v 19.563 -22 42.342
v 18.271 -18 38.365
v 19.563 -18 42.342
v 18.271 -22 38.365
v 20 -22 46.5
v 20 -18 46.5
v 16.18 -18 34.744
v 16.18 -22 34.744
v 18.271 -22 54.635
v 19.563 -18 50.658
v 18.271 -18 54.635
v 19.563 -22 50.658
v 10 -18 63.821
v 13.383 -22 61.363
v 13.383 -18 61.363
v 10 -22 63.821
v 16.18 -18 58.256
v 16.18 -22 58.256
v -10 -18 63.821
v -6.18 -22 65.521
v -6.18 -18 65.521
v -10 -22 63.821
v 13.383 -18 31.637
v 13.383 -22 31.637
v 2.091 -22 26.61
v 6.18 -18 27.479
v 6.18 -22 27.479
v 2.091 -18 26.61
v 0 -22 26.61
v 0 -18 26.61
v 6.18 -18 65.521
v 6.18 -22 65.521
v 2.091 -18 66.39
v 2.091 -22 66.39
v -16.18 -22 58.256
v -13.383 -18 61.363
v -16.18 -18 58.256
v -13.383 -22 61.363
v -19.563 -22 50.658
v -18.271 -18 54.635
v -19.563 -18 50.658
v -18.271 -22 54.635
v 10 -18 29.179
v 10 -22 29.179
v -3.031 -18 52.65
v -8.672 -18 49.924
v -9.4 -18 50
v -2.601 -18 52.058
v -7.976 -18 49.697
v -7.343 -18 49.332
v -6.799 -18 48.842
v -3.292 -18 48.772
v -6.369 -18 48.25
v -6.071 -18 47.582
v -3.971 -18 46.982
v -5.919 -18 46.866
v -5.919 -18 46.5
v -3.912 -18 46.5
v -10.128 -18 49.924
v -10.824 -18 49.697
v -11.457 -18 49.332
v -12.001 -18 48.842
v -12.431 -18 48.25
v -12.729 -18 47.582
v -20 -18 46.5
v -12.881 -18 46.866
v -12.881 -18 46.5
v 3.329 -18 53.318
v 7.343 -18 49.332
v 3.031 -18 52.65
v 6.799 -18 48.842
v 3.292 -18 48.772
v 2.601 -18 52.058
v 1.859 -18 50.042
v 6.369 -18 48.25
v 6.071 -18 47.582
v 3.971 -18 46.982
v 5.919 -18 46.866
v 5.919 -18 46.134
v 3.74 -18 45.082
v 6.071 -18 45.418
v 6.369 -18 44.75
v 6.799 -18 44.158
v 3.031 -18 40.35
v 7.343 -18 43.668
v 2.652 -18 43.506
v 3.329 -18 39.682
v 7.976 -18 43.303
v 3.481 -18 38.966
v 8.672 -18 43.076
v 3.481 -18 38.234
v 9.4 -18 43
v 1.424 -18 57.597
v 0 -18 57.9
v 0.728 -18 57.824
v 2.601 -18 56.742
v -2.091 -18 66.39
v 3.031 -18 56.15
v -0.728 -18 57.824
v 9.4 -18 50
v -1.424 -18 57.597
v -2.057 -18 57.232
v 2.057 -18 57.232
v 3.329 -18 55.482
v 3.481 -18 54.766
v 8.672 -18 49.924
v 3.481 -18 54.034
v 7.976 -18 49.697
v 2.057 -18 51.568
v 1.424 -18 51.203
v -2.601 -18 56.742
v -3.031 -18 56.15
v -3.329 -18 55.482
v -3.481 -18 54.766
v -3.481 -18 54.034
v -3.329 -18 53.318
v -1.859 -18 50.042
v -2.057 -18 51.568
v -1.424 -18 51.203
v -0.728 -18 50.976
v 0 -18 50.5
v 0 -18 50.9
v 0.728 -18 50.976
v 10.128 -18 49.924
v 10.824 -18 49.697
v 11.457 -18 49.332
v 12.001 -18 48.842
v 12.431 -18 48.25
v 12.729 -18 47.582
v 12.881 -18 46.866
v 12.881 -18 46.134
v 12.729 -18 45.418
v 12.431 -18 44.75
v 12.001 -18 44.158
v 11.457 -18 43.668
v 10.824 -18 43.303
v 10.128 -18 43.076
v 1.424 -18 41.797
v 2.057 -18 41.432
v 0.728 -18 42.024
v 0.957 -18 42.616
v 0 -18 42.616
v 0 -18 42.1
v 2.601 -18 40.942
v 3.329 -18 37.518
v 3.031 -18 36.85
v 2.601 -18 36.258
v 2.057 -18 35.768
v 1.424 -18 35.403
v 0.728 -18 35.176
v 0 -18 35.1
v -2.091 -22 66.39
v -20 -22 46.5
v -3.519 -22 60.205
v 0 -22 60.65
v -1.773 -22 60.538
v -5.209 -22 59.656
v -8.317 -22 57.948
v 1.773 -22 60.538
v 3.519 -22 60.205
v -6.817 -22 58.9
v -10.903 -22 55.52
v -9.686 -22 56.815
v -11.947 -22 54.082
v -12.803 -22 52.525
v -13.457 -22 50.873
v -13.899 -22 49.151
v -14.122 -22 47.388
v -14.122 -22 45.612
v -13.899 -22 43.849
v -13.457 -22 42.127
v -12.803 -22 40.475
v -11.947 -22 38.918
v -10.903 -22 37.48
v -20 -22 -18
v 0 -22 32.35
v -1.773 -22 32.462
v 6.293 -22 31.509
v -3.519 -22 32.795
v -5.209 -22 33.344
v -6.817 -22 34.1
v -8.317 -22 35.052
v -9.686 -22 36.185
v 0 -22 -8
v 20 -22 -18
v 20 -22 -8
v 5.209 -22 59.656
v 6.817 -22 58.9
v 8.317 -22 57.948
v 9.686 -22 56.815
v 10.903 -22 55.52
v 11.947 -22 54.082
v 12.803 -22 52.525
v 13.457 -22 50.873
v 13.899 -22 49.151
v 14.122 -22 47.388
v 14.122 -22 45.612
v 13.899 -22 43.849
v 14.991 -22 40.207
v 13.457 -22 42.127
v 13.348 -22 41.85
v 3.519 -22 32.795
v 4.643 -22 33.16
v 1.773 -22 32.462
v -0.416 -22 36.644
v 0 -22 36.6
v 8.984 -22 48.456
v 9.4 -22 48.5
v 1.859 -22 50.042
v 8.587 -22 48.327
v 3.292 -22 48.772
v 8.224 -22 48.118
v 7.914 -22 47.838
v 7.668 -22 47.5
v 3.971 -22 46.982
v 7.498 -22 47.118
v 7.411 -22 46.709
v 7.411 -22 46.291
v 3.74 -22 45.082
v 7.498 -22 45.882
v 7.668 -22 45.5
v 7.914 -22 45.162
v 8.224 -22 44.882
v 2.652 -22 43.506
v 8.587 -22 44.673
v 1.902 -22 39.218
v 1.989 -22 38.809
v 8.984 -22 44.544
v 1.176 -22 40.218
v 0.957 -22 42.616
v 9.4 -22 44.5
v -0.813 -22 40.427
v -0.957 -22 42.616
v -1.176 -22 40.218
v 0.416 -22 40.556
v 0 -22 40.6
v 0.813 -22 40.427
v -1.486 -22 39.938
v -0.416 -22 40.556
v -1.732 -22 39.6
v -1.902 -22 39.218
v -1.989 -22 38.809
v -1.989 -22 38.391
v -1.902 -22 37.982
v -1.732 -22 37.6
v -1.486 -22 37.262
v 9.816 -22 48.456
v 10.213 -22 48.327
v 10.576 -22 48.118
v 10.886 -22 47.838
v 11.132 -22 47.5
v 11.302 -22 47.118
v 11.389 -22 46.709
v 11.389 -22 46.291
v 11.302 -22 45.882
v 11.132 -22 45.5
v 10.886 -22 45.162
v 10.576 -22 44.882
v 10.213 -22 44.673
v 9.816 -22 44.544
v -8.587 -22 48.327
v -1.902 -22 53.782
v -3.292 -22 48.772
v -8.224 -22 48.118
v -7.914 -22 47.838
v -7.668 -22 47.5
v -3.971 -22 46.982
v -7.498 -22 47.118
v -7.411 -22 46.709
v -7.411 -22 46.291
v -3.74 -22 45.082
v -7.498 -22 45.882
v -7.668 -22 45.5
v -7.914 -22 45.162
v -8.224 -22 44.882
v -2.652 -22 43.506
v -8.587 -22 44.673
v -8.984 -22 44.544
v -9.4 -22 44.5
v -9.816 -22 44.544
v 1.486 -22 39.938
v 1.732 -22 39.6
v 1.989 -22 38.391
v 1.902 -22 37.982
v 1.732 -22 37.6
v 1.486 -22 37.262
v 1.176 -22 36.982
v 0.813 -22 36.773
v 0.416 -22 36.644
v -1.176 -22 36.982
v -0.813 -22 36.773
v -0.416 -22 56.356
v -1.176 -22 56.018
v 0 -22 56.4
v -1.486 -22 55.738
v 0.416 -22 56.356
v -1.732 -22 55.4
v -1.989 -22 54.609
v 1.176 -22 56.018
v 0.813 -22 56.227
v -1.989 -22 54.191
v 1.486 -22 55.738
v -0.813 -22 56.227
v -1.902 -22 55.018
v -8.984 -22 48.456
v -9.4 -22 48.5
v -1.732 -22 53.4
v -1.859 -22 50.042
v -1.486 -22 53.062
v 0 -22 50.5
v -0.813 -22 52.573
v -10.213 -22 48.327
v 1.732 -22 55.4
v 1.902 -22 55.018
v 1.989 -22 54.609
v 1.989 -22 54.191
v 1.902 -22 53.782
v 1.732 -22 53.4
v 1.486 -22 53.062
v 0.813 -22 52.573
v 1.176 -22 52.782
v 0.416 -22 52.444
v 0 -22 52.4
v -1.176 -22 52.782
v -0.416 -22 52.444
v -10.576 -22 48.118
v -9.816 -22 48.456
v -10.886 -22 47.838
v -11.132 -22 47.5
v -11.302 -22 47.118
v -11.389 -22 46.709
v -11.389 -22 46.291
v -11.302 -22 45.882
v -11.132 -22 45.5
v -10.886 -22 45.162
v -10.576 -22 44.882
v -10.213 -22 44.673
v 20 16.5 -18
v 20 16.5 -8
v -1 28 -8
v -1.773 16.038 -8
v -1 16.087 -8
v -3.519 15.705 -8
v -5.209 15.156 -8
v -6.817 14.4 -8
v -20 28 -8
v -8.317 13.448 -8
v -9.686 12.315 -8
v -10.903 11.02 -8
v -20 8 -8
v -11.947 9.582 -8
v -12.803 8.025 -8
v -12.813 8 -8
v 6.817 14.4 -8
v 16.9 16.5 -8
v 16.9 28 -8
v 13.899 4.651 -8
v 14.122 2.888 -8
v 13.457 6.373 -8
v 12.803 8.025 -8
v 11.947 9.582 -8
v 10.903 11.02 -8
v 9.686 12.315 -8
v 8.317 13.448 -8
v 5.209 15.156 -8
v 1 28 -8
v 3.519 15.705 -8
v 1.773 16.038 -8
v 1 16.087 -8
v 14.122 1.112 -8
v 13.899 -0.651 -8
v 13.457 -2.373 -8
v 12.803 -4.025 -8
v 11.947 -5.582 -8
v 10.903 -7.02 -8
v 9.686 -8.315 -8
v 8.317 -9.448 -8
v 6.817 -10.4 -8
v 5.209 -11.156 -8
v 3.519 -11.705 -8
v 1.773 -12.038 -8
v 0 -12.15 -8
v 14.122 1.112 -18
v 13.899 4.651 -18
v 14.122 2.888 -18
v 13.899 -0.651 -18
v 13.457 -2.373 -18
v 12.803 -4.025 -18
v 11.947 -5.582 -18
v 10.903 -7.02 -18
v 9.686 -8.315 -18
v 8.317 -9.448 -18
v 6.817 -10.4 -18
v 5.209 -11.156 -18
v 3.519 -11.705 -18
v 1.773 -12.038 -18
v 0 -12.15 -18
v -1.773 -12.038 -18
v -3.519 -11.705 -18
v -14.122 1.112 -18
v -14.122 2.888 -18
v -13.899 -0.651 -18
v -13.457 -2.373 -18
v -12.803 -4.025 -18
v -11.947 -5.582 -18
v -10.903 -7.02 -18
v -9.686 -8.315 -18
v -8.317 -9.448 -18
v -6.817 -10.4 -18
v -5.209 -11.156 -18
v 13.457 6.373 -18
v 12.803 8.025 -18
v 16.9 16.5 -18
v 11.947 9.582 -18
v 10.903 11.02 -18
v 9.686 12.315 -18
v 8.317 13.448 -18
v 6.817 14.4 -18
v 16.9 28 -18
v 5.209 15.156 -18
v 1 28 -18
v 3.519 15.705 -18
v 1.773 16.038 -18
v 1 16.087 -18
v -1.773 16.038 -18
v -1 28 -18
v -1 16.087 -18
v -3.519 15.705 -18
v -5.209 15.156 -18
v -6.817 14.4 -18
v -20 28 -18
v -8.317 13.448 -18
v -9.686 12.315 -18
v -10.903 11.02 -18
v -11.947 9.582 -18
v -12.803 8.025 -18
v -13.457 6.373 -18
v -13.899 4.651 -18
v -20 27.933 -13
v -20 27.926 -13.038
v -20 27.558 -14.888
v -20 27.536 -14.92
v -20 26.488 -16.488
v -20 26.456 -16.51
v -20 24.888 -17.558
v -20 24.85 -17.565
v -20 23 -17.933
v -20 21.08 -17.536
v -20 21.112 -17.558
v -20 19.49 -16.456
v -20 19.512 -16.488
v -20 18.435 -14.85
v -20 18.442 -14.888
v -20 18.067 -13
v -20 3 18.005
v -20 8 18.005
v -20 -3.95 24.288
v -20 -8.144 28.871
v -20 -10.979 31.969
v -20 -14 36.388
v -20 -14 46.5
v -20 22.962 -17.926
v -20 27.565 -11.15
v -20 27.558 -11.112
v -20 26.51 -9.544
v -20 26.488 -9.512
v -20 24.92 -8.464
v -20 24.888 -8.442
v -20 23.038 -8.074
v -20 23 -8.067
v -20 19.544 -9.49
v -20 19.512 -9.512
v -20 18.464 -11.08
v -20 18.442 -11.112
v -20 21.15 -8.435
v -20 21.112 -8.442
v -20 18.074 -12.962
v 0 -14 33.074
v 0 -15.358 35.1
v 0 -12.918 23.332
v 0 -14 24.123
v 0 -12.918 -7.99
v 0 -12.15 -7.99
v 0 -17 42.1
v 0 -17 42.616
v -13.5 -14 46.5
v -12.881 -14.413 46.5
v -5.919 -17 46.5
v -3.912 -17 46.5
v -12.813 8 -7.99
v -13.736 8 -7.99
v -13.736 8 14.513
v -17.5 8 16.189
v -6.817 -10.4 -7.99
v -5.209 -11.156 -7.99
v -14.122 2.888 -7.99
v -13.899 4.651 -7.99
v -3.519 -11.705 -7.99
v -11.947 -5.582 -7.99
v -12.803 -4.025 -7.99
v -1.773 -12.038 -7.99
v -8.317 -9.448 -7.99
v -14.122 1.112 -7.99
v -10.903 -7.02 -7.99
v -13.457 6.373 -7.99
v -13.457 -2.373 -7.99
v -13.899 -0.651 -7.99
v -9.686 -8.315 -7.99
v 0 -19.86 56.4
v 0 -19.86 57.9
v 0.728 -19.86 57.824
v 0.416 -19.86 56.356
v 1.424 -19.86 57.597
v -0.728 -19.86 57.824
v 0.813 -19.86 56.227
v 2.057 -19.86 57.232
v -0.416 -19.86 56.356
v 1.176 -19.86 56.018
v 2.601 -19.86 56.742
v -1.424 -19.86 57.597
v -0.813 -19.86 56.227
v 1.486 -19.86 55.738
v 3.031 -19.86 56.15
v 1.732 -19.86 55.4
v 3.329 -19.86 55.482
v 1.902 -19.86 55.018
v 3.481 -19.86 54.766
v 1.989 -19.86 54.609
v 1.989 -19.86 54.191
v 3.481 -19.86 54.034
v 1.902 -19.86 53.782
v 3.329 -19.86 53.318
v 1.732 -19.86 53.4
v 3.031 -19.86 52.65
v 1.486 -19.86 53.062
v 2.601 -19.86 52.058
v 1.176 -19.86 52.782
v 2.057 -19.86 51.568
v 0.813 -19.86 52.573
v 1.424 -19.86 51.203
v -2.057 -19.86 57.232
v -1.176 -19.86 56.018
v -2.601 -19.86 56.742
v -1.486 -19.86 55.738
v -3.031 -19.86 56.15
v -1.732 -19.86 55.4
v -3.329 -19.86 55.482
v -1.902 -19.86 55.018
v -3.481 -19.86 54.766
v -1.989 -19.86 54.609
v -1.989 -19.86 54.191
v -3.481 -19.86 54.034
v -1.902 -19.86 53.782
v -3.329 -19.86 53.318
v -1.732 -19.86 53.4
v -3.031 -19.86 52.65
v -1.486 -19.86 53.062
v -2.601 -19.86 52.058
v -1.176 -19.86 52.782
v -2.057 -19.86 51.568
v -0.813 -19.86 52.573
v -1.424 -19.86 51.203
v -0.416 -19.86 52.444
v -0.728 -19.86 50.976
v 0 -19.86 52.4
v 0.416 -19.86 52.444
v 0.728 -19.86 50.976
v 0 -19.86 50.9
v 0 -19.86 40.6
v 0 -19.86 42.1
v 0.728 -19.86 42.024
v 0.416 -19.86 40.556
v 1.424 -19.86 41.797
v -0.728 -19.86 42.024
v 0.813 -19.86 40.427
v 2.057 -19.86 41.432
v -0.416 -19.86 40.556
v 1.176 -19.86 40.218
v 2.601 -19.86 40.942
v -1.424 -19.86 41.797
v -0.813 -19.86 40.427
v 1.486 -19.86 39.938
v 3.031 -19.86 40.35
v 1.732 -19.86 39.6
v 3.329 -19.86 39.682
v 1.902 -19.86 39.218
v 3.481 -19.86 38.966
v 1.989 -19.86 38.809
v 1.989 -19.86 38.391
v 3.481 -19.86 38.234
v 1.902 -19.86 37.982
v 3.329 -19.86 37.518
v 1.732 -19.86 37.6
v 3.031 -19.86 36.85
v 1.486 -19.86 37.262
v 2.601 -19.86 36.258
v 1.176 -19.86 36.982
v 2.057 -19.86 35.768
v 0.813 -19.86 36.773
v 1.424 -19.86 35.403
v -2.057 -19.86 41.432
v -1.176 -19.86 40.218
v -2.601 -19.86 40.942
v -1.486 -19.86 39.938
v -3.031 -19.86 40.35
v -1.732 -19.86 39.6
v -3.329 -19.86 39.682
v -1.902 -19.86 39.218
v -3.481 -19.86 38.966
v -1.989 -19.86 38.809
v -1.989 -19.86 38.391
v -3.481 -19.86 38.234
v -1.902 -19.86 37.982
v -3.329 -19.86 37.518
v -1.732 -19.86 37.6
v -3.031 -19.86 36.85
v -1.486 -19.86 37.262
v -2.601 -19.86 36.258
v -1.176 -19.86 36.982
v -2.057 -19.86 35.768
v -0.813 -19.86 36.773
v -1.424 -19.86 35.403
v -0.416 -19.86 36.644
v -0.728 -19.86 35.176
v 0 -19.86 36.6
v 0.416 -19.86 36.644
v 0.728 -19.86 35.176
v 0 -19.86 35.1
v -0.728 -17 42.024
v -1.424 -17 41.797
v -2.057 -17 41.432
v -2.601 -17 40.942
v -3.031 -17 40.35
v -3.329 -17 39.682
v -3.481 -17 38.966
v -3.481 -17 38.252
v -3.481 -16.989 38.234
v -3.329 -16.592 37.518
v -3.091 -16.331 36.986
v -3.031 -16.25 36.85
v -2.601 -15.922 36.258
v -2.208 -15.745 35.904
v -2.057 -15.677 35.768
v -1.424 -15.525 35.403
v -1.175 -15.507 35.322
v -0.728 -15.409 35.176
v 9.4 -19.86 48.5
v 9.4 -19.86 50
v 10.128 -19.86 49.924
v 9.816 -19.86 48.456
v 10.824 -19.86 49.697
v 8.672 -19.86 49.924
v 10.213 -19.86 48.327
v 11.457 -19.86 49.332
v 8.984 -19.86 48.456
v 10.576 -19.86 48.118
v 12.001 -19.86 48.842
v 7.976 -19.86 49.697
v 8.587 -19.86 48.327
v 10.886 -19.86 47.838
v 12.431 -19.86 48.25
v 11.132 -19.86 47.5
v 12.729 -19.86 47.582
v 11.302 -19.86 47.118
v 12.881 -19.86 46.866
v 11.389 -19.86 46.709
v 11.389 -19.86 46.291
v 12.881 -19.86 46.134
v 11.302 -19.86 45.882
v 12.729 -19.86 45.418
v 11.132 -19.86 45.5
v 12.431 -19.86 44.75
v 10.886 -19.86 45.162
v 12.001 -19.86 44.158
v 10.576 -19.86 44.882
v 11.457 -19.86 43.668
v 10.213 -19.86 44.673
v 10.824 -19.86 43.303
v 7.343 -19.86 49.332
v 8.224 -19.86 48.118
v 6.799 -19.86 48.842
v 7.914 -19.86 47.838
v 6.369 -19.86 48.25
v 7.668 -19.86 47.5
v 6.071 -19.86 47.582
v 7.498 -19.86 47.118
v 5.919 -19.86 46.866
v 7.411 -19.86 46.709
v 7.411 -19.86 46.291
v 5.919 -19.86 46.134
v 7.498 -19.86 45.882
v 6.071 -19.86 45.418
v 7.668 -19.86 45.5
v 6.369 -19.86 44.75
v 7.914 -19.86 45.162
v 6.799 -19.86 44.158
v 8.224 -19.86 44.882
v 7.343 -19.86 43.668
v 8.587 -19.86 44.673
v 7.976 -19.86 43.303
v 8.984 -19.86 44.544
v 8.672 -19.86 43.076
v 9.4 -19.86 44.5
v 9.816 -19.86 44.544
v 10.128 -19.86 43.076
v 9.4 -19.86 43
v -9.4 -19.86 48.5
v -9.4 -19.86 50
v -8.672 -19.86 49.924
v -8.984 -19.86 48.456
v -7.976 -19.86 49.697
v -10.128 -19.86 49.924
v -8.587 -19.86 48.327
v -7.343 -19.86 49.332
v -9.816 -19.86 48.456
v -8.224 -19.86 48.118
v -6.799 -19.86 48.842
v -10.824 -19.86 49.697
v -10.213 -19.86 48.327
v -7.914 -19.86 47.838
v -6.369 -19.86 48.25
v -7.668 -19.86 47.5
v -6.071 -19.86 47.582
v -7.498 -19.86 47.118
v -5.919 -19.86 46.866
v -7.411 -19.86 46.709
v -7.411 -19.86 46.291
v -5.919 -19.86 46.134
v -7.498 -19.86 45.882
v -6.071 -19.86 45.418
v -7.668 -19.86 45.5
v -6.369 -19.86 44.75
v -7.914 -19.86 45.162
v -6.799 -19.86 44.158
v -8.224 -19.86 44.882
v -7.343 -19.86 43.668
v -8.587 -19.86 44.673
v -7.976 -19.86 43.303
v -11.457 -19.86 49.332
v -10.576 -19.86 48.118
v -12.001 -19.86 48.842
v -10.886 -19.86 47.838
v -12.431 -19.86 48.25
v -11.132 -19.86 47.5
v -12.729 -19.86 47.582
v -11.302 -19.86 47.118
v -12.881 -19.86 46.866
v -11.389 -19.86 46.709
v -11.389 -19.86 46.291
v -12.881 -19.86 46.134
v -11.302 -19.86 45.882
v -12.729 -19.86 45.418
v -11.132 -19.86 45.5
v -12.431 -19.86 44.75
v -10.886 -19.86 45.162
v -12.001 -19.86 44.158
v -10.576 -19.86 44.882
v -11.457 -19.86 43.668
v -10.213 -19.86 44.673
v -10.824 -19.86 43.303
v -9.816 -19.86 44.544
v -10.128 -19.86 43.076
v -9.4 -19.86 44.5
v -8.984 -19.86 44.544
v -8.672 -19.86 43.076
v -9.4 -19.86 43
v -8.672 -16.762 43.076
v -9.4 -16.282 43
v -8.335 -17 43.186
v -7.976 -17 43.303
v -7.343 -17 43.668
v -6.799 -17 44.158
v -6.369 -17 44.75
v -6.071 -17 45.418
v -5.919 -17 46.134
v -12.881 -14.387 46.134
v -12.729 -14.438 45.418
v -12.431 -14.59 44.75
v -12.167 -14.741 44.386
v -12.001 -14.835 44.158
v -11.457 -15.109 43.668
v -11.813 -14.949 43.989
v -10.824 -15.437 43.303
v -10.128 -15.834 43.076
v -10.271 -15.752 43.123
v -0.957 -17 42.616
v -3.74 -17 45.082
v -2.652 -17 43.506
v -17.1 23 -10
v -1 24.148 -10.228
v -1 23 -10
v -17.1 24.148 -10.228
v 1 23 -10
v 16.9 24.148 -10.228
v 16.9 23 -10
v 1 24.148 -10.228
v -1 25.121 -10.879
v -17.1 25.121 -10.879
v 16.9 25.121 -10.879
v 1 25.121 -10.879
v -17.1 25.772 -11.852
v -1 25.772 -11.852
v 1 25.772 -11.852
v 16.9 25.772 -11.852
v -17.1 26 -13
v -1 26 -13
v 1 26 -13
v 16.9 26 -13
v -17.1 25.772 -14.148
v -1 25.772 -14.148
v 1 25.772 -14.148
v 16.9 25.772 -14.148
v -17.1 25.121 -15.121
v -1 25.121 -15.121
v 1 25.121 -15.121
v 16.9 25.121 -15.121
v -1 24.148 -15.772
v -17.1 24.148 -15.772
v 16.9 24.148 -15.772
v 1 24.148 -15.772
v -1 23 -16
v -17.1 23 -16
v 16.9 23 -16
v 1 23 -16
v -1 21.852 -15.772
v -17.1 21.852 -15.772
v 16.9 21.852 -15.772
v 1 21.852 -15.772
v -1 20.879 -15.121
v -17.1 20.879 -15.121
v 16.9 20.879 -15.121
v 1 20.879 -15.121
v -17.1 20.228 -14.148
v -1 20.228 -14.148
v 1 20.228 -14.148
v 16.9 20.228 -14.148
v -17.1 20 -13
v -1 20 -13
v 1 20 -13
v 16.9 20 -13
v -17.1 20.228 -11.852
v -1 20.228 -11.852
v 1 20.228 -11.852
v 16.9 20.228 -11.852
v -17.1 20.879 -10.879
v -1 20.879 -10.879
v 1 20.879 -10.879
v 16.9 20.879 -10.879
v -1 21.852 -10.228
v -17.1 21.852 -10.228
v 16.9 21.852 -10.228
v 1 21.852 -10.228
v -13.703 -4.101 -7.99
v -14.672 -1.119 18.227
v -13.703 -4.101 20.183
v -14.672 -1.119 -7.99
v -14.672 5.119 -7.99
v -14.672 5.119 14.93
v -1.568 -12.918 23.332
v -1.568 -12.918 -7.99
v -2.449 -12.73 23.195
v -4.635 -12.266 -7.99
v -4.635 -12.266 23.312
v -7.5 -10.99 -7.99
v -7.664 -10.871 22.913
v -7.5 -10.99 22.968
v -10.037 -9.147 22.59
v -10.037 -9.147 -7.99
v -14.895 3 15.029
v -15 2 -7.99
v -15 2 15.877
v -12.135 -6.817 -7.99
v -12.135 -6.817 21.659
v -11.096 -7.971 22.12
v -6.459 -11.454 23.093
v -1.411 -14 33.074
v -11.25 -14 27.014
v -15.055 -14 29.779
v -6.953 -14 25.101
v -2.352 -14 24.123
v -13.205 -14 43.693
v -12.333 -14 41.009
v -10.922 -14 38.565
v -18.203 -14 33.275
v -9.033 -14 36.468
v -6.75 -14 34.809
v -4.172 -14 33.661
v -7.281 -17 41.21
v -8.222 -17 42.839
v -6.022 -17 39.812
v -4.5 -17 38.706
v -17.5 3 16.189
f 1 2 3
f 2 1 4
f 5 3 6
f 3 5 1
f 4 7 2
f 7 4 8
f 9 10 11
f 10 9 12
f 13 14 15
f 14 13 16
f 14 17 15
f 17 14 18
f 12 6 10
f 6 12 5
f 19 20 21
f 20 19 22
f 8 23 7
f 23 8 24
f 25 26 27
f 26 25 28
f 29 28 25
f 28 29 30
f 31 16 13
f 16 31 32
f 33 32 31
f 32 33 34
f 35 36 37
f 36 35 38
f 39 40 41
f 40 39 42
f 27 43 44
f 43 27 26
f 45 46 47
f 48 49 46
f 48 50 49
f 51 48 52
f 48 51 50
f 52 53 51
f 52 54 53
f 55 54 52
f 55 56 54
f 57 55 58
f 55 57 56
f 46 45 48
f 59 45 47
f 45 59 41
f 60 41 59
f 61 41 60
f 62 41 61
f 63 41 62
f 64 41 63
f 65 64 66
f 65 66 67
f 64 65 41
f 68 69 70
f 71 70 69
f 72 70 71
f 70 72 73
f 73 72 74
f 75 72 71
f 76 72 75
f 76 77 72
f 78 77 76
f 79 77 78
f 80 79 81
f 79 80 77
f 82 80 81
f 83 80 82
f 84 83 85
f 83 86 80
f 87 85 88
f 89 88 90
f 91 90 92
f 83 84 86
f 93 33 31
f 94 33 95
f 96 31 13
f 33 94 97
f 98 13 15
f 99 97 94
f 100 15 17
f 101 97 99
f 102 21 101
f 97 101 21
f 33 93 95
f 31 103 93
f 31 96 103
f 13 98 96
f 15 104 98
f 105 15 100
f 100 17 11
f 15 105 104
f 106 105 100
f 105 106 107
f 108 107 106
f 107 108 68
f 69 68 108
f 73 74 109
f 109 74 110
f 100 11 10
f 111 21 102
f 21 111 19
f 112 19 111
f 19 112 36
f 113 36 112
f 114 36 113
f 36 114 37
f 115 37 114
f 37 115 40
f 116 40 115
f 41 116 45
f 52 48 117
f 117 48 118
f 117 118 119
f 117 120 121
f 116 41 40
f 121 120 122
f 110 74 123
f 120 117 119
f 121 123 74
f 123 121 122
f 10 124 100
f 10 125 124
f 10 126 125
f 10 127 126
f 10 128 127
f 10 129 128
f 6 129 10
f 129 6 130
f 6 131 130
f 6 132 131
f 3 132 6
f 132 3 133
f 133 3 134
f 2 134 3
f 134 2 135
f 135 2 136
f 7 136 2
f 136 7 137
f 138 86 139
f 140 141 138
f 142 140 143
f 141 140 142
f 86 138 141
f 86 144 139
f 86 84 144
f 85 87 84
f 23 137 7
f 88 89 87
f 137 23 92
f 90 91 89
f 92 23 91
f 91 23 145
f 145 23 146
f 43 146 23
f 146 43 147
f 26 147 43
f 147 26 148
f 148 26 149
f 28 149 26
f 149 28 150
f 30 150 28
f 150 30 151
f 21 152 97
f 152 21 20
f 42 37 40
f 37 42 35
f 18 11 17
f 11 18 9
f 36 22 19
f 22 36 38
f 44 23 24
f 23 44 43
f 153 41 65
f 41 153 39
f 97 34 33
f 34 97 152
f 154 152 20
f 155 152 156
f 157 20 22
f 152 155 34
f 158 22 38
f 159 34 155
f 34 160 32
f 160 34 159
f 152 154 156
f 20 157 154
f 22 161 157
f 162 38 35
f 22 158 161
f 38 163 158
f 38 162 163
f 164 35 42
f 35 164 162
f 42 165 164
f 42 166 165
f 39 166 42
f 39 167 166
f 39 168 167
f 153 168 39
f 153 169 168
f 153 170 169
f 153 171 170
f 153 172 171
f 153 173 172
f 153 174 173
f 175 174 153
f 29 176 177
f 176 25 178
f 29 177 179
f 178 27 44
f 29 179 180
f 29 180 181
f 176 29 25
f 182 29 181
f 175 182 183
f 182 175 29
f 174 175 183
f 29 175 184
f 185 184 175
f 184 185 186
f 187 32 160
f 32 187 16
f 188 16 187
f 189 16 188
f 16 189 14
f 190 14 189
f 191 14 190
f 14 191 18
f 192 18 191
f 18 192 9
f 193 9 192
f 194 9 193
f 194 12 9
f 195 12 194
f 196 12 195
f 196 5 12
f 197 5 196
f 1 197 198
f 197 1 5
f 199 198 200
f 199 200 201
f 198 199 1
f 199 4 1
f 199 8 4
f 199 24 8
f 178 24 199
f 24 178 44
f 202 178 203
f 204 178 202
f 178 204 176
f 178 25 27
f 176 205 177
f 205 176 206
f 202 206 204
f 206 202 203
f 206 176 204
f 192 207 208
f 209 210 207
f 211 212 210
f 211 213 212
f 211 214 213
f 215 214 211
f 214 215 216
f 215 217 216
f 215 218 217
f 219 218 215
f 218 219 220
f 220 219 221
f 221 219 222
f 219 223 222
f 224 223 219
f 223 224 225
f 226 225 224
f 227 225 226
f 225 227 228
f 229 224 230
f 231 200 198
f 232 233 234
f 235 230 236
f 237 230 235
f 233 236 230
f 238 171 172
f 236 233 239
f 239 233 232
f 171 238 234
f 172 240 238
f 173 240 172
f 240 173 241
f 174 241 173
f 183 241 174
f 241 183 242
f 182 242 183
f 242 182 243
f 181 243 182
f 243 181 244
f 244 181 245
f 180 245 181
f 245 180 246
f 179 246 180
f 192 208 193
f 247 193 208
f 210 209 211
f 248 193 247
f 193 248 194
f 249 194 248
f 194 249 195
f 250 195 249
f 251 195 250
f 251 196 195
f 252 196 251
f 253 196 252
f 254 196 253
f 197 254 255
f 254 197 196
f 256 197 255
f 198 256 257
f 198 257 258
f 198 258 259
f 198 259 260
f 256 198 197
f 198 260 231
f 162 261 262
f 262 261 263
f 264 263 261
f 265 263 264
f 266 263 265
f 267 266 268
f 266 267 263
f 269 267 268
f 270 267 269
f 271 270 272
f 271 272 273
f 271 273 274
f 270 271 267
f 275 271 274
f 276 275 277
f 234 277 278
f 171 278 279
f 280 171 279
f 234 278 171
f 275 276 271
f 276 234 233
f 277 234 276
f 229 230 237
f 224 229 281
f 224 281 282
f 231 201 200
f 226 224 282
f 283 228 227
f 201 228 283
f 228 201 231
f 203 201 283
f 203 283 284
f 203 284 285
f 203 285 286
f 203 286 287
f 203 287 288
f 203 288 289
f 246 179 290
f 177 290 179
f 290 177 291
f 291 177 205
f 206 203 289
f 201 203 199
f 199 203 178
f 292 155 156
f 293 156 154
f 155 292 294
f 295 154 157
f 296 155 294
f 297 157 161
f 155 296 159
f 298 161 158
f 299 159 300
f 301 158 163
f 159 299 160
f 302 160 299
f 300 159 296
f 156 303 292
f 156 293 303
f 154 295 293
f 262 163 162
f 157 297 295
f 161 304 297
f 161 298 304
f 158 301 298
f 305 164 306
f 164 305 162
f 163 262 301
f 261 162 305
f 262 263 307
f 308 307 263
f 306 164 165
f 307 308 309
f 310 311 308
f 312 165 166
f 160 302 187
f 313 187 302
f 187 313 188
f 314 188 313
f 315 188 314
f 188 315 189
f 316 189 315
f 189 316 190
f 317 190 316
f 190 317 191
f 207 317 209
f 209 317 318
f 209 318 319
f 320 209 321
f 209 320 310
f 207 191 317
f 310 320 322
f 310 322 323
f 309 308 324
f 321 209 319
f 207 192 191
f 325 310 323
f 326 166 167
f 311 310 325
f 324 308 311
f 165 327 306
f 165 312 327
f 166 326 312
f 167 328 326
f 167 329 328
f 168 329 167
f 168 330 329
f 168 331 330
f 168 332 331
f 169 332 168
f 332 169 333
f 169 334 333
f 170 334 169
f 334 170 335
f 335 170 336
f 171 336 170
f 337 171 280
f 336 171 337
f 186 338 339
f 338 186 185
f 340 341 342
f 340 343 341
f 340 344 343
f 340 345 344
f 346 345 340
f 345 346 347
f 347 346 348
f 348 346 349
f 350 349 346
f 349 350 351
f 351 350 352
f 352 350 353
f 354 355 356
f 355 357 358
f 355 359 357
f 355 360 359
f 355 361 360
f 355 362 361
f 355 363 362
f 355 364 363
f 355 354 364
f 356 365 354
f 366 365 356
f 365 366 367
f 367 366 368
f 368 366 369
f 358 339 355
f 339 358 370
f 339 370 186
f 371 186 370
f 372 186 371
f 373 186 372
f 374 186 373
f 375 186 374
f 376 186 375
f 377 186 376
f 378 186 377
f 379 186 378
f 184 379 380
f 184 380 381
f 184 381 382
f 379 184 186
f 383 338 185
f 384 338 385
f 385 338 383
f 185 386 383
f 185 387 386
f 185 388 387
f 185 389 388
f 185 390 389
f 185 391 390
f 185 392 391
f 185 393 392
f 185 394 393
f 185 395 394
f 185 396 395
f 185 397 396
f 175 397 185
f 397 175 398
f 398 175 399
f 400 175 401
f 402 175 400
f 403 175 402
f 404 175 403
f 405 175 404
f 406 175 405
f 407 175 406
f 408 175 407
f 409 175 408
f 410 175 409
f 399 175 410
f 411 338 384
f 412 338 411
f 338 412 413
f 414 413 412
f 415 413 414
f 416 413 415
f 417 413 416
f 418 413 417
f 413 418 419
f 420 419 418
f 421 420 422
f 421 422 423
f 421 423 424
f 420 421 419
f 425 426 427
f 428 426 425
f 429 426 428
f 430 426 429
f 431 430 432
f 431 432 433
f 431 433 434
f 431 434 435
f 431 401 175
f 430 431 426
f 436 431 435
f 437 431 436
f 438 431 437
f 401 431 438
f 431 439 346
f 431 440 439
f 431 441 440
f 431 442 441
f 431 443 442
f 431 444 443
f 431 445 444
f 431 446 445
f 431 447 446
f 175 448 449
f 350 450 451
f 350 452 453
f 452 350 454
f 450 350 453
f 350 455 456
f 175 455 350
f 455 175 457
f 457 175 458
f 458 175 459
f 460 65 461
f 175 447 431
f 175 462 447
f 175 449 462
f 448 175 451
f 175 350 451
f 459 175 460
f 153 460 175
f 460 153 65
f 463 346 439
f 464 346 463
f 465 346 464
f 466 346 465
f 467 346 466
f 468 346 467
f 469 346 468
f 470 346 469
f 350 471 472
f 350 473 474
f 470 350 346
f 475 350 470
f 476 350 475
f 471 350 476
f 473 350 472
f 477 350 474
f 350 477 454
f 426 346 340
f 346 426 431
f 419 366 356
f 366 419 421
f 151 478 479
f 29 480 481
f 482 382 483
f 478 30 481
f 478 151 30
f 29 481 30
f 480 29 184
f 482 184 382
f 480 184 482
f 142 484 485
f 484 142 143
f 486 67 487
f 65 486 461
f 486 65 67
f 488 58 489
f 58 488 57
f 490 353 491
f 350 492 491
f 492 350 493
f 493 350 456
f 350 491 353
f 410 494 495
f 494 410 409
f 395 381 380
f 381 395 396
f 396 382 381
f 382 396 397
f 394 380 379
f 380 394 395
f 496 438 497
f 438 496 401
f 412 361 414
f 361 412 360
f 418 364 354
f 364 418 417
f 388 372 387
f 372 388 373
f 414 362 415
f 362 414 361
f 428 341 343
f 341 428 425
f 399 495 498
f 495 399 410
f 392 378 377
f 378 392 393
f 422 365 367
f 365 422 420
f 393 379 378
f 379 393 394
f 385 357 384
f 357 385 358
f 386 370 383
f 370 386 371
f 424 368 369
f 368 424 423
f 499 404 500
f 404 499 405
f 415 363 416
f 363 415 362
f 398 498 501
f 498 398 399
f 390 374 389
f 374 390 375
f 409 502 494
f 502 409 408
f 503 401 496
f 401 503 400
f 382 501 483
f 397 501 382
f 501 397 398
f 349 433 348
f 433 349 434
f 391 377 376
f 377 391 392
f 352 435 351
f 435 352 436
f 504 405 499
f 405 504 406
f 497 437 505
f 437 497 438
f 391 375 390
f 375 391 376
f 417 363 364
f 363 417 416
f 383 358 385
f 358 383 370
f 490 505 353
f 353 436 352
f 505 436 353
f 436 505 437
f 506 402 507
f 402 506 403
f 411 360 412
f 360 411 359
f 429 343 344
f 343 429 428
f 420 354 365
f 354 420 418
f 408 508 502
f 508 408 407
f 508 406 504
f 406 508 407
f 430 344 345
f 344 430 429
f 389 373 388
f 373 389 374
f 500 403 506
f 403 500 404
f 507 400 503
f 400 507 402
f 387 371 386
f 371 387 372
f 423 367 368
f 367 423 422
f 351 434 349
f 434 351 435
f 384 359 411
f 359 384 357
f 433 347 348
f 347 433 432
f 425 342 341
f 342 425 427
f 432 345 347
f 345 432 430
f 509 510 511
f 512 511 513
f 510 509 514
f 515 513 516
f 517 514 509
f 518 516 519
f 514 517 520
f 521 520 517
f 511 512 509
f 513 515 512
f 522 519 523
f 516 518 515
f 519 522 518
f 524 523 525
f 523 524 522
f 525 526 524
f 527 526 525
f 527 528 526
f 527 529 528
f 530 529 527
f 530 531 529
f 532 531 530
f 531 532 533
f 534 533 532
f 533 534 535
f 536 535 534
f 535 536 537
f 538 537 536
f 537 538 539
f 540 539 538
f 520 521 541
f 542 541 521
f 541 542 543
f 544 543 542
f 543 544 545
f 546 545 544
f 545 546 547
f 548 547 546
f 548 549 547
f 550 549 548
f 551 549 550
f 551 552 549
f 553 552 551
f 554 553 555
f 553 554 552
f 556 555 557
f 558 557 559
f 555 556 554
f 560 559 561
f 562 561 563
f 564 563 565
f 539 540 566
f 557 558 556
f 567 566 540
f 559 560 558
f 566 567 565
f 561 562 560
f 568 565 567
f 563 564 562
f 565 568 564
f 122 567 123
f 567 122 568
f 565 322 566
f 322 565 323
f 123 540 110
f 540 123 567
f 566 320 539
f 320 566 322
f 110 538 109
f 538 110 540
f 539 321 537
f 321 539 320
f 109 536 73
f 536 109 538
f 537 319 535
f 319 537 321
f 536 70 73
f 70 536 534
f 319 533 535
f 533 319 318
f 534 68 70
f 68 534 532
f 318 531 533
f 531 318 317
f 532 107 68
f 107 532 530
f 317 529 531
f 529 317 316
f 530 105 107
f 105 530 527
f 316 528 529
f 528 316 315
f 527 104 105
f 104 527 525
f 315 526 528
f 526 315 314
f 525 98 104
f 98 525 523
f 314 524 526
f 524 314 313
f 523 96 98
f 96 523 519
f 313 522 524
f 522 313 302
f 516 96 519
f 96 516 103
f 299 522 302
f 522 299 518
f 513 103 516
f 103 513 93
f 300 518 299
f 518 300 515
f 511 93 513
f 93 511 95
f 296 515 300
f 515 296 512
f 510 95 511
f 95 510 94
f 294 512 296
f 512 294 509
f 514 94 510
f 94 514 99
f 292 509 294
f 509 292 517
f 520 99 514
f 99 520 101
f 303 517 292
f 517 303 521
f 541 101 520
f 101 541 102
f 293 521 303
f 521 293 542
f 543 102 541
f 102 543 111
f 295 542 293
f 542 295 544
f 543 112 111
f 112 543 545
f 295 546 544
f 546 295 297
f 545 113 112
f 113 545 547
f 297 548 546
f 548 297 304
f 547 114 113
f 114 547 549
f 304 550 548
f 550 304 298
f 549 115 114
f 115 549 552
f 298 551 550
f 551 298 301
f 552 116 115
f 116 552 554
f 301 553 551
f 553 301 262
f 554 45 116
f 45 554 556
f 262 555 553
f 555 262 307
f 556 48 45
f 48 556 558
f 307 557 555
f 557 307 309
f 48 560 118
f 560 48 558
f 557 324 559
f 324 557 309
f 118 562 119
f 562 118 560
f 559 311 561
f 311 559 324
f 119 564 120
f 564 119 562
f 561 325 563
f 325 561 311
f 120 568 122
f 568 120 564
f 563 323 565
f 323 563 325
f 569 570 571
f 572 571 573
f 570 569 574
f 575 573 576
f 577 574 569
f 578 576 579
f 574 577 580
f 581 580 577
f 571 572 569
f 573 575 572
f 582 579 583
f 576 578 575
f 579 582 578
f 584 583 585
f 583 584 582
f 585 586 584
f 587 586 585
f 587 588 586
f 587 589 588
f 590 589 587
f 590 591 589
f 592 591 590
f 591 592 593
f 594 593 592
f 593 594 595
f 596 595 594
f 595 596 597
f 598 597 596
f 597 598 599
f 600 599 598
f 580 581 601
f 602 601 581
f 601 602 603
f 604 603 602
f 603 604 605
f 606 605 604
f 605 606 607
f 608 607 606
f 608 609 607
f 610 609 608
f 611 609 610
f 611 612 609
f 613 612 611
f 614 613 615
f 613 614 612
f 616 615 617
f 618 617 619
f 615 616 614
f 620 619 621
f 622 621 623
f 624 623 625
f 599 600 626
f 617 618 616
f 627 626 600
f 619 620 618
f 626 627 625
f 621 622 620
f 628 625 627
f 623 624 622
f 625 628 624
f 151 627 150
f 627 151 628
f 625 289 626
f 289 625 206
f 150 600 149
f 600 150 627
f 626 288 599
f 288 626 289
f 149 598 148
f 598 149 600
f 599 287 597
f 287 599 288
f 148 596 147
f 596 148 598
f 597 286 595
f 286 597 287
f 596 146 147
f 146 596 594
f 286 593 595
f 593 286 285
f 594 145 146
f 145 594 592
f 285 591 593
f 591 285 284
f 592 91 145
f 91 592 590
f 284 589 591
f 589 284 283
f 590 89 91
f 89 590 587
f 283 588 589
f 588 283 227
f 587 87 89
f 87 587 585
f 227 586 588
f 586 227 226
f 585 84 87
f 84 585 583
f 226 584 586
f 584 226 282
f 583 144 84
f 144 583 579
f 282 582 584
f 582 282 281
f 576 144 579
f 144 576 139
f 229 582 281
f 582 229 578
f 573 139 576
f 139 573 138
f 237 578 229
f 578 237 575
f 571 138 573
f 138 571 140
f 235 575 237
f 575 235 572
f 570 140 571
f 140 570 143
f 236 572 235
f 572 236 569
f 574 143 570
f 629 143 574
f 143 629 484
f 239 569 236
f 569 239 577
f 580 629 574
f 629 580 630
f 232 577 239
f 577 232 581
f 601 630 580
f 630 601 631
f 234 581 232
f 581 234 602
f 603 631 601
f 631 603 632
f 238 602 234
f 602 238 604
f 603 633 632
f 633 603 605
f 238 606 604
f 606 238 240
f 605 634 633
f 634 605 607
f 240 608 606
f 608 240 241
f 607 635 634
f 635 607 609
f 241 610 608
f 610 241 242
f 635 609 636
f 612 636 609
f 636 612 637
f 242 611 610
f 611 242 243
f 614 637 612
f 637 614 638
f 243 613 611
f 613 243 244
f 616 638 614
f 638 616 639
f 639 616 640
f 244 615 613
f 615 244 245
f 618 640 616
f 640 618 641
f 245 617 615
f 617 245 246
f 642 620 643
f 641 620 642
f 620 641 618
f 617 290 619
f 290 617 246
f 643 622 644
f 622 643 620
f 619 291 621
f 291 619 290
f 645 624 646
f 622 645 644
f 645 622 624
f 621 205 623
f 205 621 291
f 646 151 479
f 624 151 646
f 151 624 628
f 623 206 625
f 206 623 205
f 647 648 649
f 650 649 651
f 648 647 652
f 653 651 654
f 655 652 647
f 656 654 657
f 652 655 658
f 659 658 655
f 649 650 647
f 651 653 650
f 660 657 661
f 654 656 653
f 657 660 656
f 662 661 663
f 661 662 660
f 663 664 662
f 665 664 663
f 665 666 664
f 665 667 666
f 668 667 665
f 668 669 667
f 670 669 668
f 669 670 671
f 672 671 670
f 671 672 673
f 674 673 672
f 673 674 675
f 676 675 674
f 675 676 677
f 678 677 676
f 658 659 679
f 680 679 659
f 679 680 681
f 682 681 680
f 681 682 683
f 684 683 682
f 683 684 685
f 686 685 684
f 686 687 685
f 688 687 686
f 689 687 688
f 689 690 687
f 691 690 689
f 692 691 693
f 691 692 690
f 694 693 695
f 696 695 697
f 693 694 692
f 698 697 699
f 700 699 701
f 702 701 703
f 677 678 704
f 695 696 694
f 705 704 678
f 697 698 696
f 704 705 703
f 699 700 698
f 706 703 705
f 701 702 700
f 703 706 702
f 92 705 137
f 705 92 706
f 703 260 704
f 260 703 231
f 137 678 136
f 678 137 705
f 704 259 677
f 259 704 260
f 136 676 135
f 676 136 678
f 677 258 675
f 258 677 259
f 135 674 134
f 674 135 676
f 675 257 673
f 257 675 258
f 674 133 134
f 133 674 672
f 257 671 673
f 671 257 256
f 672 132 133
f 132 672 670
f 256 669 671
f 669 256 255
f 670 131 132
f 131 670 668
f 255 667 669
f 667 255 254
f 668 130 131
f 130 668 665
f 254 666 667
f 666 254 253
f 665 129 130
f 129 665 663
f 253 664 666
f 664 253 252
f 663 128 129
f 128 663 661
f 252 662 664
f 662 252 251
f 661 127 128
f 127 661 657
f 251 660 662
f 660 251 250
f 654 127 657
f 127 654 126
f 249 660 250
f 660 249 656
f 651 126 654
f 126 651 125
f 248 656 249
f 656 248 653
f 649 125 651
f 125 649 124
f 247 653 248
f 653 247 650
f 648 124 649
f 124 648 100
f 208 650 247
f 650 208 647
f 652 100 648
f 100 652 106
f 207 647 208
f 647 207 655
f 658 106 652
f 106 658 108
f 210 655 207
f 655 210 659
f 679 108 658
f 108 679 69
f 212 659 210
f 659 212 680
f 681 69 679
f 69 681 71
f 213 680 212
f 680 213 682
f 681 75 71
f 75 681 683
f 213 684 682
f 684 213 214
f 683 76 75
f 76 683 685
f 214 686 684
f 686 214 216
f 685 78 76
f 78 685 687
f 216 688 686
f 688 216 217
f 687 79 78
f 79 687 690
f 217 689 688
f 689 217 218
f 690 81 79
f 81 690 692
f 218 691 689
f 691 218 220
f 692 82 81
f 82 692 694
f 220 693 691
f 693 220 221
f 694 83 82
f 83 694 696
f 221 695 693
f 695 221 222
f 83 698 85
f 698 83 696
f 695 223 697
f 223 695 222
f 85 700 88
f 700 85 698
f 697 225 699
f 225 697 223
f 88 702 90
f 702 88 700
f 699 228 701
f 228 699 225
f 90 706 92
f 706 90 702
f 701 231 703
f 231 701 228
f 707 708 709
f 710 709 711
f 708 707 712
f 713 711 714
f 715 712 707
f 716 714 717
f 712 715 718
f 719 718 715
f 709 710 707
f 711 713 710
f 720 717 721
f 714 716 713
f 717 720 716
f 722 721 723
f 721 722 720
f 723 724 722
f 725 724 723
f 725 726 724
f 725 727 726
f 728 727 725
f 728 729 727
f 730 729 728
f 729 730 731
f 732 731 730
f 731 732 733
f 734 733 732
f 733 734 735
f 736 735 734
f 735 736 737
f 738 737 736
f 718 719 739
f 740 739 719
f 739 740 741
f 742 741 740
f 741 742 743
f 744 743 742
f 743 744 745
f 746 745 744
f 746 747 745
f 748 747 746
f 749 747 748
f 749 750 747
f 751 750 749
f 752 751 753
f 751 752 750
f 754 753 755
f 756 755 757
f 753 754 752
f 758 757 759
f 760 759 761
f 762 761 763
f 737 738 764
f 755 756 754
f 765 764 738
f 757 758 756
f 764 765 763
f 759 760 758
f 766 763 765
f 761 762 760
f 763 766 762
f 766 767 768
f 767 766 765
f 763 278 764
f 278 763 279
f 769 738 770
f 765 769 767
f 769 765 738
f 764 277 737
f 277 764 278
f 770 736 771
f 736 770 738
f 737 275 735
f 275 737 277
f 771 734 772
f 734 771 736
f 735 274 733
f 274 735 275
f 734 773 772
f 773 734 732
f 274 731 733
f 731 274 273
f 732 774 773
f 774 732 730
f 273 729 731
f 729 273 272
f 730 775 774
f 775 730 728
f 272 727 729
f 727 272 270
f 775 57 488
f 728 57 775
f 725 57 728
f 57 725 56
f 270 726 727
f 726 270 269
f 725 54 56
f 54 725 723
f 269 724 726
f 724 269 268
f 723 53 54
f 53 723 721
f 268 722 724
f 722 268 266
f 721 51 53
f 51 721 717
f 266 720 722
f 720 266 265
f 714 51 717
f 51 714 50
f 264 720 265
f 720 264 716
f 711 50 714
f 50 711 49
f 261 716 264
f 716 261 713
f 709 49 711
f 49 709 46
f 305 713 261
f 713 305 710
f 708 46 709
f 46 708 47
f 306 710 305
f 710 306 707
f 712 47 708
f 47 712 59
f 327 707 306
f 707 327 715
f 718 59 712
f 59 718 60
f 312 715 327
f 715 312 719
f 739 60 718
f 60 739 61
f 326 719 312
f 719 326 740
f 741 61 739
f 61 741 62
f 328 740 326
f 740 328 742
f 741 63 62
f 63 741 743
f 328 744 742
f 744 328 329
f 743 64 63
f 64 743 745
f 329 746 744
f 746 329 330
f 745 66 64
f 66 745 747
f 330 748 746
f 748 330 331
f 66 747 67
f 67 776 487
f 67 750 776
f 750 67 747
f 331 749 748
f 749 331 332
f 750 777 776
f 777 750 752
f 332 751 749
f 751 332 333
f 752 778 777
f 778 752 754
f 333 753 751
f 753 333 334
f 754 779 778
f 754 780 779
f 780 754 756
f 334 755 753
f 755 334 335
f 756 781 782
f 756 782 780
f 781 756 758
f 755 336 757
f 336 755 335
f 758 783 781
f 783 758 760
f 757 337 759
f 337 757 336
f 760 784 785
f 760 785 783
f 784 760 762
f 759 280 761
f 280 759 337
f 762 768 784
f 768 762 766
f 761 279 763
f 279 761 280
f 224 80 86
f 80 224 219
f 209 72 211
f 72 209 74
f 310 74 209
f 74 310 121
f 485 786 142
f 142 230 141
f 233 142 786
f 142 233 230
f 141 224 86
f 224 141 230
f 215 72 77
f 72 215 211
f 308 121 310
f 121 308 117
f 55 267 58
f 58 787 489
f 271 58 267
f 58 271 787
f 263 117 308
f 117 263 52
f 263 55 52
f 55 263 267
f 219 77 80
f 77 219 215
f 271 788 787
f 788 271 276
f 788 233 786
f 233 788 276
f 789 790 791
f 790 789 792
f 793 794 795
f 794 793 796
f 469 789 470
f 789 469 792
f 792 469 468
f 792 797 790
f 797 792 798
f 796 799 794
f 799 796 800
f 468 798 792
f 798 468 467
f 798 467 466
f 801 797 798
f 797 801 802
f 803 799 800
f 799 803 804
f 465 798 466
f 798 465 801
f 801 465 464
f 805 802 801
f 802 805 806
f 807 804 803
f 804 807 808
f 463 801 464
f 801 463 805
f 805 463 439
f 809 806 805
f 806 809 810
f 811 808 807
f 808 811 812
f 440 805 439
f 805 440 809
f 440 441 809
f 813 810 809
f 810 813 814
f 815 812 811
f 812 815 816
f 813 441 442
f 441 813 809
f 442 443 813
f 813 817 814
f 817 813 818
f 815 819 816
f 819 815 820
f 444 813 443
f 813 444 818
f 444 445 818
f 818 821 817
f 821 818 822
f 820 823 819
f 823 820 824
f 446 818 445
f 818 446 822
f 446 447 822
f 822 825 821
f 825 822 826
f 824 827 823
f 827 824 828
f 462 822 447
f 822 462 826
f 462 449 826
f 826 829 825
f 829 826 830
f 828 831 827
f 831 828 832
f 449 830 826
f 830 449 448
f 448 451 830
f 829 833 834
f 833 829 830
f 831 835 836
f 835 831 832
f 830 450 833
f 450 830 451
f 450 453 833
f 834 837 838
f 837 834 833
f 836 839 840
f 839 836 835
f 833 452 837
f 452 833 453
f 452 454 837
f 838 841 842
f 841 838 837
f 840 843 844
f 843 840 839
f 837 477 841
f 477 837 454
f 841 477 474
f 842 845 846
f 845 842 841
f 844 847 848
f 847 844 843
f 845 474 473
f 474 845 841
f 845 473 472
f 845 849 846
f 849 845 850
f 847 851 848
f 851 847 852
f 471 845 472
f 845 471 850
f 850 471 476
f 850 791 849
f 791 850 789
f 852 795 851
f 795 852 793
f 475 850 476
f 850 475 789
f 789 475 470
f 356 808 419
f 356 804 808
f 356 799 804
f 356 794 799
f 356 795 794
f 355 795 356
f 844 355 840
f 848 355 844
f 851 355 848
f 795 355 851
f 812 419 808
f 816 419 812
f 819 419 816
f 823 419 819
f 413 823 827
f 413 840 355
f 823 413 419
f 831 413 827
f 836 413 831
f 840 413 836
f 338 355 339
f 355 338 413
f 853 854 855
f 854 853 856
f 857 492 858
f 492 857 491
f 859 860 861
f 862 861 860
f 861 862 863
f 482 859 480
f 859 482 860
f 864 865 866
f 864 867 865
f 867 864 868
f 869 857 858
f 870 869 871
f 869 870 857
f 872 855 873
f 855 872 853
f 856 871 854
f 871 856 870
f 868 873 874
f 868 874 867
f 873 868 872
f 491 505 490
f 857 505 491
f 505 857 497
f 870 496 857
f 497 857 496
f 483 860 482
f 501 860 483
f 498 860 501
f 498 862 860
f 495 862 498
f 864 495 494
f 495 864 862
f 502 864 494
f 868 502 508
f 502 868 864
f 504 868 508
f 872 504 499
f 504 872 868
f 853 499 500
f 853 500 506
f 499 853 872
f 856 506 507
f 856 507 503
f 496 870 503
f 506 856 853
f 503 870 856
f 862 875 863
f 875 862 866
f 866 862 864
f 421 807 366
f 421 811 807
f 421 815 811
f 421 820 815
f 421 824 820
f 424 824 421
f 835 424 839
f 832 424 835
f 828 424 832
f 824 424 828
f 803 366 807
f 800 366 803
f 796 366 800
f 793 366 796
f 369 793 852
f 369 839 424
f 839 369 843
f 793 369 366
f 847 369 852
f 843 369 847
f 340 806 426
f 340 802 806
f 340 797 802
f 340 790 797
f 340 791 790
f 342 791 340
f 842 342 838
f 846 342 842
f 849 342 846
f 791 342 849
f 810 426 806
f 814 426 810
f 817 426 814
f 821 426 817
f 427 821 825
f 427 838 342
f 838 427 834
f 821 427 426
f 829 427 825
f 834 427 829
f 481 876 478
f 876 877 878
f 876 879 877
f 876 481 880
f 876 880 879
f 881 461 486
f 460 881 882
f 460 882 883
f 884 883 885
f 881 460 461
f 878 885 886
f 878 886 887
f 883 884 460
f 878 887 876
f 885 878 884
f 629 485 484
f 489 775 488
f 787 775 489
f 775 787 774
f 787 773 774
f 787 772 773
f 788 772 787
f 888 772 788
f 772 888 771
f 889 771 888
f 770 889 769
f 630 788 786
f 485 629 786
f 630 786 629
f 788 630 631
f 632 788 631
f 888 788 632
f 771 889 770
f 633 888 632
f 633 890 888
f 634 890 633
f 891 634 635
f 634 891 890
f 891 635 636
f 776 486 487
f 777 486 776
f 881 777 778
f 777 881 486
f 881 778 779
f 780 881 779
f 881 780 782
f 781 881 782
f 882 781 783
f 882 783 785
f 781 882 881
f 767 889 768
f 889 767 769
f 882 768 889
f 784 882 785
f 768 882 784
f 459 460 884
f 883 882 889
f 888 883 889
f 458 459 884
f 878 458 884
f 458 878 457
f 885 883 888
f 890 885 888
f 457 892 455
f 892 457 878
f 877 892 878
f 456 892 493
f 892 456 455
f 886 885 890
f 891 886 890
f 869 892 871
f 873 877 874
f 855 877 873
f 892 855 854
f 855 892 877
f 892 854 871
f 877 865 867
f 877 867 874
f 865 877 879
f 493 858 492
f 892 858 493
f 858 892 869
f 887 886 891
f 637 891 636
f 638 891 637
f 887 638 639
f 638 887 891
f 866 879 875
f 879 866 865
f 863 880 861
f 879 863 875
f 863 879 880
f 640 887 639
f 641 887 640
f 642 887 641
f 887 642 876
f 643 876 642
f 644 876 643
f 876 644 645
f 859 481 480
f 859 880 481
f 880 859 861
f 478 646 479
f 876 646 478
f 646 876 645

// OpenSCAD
module hole(){
	//cylinder(r=4/2,h=2.1, $fn=30);
	translate([0,0,2.14-4])
		rotate_extrude($fn=30)
			polygon([[0,0],[2,0],[2,4],[7/2,4],[7/2,15],[0,15]]);
}
module motor(){
	rholeY=(22.8-4)/2;
	rholeX=(19.8-4)/2;
	diameter=28.3;
	translate([0,0,-24.5-2]){
		translate([0,0,2])
			cylinder(r=diameter/2, h=17.2, $fn=50);
		translate([0,0,2+17.5])
			cylinder(r=diameter/2, h=24.5-17.5, $fn=50);
		cylinder(r=9/2, h=2);
		rotate([0,0,45])
			translate([12.3/-2,0,2+17.5])
				cube([12.3,29.2-diameter/2,24.5-17.5]);
		translate([rholeX,0,24.5+2])
			hole();
		translate([-rholeX,0,24.5+2])
			hole();
		translate([0,rholeY,24.5+2])
			hole();
		translate([0,-rholeY,24.5+2])
			hole();
	}
		cylinder(r=8/2,h=10);
}
module motors(){
	translate([0,2,0])
		rotate([0,0,-90])
			motor();
	rotate([0,0,180])
		translate([0,22,48-1.5])
			rotate([90,-90,0])
				motor();
}
module arm(){
	difference(){
		union(){
			translate([0,-22,46.5])
				rotate([-90,0,0])
					cylinder(r=20,h=4)
			translate([40/-2,-22,15])
				cube([40,4,46.5-15]);
			translate([-20,-22,-18])
				cube([40,50,10]);
			translate([-20,-22,-18])
				cube([20,30,46.5+18]);
		}		
		translate([0,2,-7.99])
			cylinder(r=15,h=60);
		translate([-1,0,-18.5])
		cube([2,30,12]);
		gopro();
		motors();
		translate([-20.1,23,-13])
			rotate([0,90,0])
				screw();
	}
}
module gopro(){
	translate([0,-22,48-1.5])
		rotate([-90,0,0])
		translate([0,0,5])
			rotate_extrude()
				polygon([[0,28],[0,0],[9,0],[13.5,3],[24-1.5,3],[35,20],[35,30]]);
}
module screw(){
	rotate_extrude()
		polygon([[0,0],[5,0],[3,3],[3,50],[0,50]]);
	translate([-5.5,-6.5,37])
		cube([11,13,4]);
}
//gopro();
//motors();
//screw();
arm();
//hole();
